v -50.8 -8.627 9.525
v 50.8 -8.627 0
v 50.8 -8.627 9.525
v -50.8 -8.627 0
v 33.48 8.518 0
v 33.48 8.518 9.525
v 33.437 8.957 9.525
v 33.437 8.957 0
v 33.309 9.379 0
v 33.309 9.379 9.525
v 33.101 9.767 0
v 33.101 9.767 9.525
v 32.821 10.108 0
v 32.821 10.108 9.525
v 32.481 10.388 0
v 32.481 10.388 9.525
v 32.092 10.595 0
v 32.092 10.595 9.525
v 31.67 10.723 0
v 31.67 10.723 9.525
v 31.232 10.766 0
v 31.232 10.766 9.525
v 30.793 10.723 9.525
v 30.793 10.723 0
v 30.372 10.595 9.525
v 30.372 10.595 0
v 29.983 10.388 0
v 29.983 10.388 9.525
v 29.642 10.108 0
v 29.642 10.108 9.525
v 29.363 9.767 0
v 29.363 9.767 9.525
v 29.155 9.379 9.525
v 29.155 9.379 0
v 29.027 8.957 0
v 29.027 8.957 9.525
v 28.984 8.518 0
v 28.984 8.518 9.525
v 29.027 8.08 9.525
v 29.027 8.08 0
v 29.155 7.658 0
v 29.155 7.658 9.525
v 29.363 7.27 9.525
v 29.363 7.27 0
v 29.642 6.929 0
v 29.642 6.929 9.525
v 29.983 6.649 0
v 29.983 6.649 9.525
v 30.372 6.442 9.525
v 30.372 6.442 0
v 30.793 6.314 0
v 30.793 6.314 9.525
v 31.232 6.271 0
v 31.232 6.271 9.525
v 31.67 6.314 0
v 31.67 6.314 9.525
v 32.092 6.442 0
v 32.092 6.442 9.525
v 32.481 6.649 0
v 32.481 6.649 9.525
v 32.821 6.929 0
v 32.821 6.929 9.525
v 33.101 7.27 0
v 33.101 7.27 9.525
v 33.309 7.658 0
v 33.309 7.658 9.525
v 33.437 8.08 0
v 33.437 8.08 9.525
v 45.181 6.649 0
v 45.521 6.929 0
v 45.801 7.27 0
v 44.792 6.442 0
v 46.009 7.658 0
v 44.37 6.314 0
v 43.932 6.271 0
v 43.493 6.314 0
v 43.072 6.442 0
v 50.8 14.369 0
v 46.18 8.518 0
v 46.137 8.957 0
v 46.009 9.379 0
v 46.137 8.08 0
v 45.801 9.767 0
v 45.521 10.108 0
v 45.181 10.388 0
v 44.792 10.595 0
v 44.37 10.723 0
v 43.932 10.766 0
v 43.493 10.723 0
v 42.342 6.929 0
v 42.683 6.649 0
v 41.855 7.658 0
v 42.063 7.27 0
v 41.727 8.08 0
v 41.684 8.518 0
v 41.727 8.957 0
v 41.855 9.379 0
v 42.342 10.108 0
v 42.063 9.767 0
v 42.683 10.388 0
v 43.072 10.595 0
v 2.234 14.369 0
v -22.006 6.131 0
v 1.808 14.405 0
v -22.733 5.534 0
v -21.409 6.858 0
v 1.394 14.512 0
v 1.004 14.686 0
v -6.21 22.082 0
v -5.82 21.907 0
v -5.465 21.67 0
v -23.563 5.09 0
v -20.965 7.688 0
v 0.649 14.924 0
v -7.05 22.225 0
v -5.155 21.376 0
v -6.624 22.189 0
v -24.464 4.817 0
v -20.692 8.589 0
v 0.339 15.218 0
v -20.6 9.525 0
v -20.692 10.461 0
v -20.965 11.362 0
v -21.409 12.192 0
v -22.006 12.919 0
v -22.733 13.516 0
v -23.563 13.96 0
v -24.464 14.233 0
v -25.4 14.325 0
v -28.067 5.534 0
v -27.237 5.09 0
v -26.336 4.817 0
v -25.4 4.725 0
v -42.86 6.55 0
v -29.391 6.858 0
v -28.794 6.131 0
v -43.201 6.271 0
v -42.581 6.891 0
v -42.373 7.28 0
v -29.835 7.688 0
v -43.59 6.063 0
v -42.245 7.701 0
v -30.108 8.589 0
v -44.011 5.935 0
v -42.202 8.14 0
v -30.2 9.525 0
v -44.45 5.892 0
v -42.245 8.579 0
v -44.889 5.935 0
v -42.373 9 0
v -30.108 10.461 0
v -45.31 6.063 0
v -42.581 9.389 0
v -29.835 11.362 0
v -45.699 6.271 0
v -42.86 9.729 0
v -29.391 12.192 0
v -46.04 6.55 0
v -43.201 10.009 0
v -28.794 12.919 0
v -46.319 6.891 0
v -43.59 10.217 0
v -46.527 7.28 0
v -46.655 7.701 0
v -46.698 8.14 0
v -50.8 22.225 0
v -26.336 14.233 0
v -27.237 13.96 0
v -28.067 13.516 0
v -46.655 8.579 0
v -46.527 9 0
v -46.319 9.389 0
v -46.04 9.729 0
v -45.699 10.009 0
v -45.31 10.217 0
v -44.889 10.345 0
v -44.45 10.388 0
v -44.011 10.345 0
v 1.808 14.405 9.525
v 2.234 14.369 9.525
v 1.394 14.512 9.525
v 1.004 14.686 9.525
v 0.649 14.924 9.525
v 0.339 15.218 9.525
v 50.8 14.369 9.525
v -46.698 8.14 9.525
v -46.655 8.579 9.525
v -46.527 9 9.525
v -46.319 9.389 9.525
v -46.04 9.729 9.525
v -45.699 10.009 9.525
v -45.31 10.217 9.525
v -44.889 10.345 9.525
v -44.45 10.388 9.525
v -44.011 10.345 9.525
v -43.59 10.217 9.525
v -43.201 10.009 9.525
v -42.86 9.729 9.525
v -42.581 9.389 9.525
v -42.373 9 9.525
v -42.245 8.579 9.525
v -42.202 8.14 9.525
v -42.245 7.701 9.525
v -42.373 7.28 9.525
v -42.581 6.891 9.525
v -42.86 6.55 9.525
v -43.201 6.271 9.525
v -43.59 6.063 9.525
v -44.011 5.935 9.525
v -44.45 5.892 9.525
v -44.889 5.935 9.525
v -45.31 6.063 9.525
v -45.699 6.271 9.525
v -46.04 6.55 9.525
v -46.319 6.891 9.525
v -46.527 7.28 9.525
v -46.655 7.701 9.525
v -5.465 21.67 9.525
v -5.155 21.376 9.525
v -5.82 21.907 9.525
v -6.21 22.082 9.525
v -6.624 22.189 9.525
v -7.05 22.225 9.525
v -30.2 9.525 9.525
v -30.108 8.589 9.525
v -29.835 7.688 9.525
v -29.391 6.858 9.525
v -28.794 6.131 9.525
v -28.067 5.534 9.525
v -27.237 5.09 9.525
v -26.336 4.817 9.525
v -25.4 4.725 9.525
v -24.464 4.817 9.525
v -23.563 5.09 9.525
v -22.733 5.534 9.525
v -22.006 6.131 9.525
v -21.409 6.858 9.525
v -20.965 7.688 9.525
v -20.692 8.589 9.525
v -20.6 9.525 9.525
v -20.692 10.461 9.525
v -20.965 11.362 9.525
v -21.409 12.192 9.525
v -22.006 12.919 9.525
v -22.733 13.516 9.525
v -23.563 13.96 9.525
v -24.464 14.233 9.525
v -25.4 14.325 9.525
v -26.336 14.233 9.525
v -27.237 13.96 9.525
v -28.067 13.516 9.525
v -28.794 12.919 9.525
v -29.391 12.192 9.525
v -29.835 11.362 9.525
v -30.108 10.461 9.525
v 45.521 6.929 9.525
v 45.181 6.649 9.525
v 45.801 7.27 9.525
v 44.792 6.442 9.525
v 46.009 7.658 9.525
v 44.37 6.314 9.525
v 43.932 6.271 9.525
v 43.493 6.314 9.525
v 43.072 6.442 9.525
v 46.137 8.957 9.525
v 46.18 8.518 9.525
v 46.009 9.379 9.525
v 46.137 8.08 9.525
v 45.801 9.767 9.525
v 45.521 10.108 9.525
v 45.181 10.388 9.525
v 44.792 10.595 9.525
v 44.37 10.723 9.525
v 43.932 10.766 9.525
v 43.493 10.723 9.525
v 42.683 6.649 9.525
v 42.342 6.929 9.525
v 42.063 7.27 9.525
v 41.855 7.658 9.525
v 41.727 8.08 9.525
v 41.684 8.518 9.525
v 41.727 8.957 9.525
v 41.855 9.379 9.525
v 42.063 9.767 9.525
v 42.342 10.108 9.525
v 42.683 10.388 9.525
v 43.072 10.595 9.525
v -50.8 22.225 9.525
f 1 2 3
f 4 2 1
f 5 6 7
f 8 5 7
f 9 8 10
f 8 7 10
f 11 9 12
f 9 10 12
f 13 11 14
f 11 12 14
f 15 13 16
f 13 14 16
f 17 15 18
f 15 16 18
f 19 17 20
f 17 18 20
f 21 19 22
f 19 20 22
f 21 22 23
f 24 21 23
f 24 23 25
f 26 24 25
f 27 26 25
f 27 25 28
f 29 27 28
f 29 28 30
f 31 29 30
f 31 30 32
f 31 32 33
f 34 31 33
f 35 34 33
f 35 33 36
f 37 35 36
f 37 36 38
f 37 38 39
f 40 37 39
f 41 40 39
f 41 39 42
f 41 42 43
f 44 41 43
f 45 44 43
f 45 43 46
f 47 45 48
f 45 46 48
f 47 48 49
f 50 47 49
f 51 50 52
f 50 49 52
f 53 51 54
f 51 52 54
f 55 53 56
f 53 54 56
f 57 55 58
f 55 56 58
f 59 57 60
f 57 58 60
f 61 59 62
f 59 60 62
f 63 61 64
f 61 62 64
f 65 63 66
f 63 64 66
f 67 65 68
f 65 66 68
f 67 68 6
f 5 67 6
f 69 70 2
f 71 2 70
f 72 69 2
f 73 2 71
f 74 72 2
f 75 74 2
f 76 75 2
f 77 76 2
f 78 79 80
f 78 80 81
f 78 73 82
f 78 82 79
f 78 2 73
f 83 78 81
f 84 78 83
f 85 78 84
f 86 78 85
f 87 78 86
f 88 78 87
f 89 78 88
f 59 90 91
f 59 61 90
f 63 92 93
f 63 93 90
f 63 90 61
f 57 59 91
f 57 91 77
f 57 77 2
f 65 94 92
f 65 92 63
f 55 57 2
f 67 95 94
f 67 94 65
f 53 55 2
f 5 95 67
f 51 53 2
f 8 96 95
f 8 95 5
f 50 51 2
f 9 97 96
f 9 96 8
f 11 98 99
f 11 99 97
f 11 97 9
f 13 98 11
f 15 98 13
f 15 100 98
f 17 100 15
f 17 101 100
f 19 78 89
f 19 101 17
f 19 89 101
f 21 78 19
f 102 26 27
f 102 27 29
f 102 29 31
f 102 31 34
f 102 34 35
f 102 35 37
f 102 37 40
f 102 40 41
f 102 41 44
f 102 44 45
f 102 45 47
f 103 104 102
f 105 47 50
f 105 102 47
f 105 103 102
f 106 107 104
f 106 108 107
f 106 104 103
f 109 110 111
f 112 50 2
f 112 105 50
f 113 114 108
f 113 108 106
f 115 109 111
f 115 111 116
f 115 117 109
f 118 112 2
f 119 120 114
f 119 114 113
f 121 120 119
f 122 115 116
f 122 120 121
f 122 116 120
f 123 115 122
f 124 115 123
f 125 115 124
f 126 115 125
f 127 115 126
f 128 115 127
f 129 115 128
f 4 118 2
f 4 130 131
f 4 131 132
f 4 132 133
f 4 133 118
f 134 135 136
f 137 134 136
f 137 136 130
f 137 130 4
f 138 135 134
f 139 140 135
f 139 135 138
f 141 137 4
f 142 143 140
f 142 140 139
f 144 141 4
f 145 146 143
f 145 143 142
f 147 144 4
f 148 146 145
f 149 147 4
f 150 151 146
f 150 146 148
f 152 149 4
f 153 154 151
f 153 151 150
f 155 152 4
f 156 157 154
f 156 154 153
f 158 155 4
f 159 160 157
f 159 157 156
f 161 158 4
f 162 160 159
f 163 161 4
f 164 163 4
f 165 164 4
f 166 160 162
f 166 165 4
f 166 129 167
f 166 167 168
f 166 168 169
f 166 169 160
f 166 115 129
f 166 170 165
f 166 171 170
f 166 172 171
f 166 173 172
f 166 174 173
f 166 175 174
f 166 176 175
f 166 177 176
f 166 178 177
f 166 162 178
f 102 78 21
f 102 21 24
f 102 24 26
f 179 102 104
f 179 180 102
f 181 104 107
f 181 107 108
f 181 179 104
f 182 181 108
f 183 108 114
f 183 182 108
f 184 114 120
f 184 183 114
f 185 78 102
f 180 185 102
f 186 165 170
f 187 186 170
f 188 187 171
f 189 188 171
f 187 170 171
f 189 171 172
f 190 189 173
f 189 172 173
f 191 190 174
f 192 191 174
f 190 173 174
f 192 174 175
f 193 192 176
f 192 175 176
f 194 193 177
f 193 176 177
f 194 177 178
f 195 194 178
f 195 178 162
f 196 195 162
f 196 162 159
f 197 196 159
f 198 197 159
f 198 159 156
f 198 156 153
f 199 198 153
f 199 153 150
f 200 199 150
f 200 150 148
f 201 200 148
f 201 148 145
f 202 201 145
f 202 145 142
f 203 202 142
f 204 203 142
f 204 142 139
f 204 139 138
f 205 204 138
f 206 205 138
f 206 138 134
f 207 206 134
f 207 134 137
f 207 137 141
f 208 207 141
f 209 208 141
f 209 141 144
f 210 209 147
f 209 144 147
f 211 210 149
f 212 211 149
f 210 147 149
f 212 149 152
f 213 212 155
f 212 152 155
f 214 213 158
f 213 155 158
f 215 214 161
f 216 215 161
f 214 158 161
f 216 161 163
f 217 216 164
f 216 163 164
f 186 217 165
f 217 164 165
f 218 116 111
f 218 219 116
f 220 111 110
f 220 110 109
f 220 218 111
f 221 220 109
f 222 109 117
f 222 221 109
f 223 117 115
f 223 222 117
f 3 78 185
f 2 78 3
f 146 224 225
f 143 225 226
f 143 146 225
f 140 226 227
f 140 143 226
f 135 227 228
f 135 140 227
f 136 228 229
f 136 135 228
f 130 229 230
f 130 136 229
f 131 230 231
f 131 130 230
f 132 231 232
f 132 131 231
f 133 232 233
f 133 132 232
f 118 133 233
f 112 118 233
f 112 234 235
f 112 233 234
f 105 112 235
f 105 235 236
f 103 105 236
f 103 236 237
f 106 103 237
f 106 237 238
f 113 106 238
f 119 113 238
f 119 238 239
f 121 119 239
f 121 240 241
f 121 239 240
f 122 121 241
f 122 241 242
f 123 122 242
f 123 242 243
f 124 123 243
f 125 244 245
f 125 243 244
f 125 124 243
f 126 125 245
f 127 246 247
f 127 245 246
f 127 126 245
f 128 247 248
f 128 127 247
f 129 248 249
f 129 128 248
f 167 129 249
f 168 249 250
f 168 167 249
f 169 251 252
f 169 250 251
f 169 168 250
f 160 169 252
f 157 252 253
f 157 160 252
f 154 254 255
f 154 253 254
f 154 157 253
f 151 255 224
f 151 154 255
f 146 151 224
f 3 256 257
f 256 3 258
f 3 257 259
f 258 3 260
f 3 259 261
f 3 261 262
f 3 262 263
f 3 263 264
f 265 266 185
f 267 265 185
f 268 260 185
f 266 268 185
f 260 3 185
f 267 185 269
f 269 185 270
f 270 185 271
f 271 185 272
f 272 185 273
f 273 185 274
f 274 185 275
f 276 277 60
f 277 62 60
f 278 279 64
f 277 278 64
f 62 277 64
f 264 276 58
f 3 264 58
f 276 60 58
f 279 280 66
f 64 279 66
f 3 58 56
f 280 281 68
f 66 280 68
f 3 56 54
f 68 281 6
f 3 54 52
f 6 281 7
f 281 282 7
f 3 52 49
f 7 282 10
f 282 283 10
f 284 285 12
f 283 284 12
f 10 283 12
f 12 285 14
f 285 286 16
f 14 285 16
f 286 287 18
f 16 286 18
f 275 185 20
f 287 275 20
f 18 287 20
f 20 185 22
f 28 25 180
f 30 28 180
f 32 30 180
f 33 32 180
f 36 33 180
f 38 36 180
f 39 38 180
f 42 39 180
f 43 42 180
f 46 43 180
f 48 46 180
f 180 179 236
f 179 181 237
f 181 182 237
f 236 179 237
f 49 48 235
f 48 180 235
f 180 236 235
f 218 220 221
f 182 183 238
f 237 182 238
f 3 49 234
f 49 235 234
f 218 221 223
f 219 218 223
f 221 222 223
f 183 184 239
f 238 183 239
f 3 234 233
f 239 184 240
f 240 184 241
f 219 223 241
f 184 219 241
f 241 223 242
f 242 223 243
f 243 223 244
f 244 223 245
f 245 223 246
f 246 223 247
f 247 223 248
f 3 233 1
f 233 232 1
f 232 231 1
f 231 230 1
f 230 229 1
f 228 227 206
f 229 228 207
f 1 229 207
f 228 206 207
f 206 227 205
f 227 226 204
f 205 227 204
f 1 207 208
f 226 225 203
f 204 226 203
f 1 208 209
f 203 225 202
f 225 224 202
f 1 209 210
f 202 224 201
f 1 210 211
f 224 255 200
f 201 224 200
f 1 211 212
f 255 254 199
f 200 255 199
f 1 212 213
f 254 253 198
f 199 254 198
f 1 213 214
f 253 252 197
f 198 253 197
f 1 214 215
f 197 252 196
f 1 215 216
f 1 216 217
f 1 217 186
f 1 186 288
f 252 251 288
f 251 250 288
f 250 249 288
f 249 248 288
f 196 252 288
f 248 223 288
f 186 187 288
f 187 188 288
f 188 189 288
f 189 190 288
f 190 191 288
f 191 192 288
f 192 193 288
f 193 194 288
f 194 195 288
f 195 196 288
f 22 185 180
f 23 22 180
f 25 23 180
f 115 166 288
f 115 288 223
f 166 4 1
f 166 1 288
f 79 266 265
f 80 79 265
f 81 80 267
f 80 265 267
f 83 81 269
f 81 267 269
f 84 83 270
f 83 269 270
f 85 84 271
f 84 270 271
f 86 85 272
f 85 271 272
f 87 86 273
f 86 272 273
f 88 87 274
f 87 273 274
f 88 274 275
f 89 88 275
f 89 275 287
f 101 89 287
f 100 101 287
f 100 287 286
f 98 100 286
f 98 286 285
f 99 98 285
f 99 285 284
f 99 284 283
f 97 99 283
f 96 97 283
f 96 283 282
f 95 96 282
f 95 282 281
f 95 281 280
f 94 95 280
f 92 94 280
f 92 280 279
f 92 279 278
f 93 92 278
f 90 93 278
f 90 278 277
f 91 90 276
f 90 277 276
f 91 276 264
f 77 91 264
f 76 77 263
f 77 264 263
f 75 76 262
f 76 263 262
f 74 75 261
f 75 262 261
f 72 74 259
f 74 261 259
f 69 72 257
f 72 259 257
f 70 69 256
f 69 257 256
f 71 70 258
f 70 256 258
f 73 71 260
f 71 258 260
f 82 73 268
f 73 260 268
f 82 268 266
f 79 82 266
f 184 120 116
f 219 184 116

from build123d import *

# Parameters (mm, degrees)
BOSS_EXTRUDE1_DEPTH   = 9.525
SKETCH6_R             = 4.800000000000002
CUT_EXTRUDE1_DEPTH    = 57.261143340675204
SKETCH10_R            = 2.2859999999999947
CUT_EXTRUDE2_DEPTH    = 3.8099999999999996
F_8_CLEARANCE_HOLE1_D = 4.4958
SKETCH13_W            = 109.6136957213275
SKETCH13_H            = 27.196963560799638
CUT_EXTRUDE3_DEPTH    = 57.261143340675204
CUT_EXTRUDE5_DEPTH    = 57.2611433406752
FILLET1_R             = 2.54
SKETCH15_R            = 2.24789999999999
CUT_EXTRUDE6_DEPTH    = 57.26114334073907


with BuildPart() as part:
    # Sketch1 → Boss-Extrude1 (new body)
    with BuildSketch(Plane.XY):
        Polygon((50.79999999999998, -22.225), (-50.800000000000004, -22.225000000000012), (-50.800000000000004, 22.224999999999984), (50.79999999999999, 22.224999999999998), align=None)
    extrude(amount=BOSS_EXTRUDE1_DEPTH)

    # Sketch6 → Cut-Extrude1 (cut, through all)
    with BuildSketch(Plane.XY):
        with Locations(Location((-25.4, 9.524999999999999, 0), (0, 0, 180))):
            Circle(SKETCH6_R)
    extrude(amount=CUT_EXTRUDE1_DEPTH, mode=Mode.SUBTRACT)

    # Sketch10 → Cut-Extrude2 (cut)
    with BuildSketch(Plane.XY.offset(9.525)):
        with Locations((-46.11545283004946, -16.76399999999999)):
            Circle(SKETCH10_R)
    extrude(amount=-CUT_EXTRUDE2_DEPTH, mode=Mode.SUBTRACT)

    # #8 Clearance Hole1 (through all)
    with Locations(Plane(origin=(0, 0, 0), x_dir=(-1, 0, 0), z_dir=(0, 0, -1))):
        with Locations((-43.931814057, 8.51848178), (-31.231814057, 8.51848178)):
            Hole(F_8_CLEARANCE_HOLE1_D / 2)

    # Sketch13 → Cut-Extrude3 (cut, through all)
    with BuildSketch(Plane(origin=(0, 0, 0), x_dir=(-1, 0, 0), z_dir=(0, 0, -1))):
        with Locations((0, -22.225000000072345)):
            Rectangle(SKETCH13_W, SKETCH13_H)
    extrude(amount=-CUT_EXTRUDE3_DEPTH, mode=Mode.SUBTRACT)

    # Sketch14 → Cut-Extrude5 (cut, through all)
    with BuildSketch(Plane(origin=(0, 0, 0), x_dir=(-1, 0, 0), z_dir=(0, 0, -1))):
        Polygon((-50.80000000007075, 14.368885078592964), (-1.0960952551413707, 14.368885078592964), (-0.33859307620571544, 15.218043280381785), (6.4513217163673575, 22.82952215911174), (6.4513217163673575, 26.369267610296045), (-61.117569834071936, 26.369267610296045), (-61.117569834071936, 13.29236417327235), align=None)
    extrude(amount=-CUT_EXTRUDE5_DEPTH, mode=Mode.SUBTRACT)

    # Fillet1
    fillet1_edges = [part.edges().sort_by_distance(p)[0] for p in [
        (-5.912050174530525, 22.22499999999999, 4.7625),
        (1.0960952551413707, 14.368885078592964, 4.7625),
    ]]
    fillet(fillet1_edges, radius=FILLET1_R)

    # Sketch15 → Cut-Extrude6 (cut, through all)
    with BuildSketch(Plane(origin=(0, 0, 0), x_dir=(-1, 0, 0), z_dir=(0, 0, -1))):
        with Locations((44.4499999999996, 8.139974193482002)):
            Circle(SKETCH15_R)
    extrude(amount=-CUT_EXTRUDE6_DEPTH, mode=Mode.SUBTRACT)


solid = part.part
